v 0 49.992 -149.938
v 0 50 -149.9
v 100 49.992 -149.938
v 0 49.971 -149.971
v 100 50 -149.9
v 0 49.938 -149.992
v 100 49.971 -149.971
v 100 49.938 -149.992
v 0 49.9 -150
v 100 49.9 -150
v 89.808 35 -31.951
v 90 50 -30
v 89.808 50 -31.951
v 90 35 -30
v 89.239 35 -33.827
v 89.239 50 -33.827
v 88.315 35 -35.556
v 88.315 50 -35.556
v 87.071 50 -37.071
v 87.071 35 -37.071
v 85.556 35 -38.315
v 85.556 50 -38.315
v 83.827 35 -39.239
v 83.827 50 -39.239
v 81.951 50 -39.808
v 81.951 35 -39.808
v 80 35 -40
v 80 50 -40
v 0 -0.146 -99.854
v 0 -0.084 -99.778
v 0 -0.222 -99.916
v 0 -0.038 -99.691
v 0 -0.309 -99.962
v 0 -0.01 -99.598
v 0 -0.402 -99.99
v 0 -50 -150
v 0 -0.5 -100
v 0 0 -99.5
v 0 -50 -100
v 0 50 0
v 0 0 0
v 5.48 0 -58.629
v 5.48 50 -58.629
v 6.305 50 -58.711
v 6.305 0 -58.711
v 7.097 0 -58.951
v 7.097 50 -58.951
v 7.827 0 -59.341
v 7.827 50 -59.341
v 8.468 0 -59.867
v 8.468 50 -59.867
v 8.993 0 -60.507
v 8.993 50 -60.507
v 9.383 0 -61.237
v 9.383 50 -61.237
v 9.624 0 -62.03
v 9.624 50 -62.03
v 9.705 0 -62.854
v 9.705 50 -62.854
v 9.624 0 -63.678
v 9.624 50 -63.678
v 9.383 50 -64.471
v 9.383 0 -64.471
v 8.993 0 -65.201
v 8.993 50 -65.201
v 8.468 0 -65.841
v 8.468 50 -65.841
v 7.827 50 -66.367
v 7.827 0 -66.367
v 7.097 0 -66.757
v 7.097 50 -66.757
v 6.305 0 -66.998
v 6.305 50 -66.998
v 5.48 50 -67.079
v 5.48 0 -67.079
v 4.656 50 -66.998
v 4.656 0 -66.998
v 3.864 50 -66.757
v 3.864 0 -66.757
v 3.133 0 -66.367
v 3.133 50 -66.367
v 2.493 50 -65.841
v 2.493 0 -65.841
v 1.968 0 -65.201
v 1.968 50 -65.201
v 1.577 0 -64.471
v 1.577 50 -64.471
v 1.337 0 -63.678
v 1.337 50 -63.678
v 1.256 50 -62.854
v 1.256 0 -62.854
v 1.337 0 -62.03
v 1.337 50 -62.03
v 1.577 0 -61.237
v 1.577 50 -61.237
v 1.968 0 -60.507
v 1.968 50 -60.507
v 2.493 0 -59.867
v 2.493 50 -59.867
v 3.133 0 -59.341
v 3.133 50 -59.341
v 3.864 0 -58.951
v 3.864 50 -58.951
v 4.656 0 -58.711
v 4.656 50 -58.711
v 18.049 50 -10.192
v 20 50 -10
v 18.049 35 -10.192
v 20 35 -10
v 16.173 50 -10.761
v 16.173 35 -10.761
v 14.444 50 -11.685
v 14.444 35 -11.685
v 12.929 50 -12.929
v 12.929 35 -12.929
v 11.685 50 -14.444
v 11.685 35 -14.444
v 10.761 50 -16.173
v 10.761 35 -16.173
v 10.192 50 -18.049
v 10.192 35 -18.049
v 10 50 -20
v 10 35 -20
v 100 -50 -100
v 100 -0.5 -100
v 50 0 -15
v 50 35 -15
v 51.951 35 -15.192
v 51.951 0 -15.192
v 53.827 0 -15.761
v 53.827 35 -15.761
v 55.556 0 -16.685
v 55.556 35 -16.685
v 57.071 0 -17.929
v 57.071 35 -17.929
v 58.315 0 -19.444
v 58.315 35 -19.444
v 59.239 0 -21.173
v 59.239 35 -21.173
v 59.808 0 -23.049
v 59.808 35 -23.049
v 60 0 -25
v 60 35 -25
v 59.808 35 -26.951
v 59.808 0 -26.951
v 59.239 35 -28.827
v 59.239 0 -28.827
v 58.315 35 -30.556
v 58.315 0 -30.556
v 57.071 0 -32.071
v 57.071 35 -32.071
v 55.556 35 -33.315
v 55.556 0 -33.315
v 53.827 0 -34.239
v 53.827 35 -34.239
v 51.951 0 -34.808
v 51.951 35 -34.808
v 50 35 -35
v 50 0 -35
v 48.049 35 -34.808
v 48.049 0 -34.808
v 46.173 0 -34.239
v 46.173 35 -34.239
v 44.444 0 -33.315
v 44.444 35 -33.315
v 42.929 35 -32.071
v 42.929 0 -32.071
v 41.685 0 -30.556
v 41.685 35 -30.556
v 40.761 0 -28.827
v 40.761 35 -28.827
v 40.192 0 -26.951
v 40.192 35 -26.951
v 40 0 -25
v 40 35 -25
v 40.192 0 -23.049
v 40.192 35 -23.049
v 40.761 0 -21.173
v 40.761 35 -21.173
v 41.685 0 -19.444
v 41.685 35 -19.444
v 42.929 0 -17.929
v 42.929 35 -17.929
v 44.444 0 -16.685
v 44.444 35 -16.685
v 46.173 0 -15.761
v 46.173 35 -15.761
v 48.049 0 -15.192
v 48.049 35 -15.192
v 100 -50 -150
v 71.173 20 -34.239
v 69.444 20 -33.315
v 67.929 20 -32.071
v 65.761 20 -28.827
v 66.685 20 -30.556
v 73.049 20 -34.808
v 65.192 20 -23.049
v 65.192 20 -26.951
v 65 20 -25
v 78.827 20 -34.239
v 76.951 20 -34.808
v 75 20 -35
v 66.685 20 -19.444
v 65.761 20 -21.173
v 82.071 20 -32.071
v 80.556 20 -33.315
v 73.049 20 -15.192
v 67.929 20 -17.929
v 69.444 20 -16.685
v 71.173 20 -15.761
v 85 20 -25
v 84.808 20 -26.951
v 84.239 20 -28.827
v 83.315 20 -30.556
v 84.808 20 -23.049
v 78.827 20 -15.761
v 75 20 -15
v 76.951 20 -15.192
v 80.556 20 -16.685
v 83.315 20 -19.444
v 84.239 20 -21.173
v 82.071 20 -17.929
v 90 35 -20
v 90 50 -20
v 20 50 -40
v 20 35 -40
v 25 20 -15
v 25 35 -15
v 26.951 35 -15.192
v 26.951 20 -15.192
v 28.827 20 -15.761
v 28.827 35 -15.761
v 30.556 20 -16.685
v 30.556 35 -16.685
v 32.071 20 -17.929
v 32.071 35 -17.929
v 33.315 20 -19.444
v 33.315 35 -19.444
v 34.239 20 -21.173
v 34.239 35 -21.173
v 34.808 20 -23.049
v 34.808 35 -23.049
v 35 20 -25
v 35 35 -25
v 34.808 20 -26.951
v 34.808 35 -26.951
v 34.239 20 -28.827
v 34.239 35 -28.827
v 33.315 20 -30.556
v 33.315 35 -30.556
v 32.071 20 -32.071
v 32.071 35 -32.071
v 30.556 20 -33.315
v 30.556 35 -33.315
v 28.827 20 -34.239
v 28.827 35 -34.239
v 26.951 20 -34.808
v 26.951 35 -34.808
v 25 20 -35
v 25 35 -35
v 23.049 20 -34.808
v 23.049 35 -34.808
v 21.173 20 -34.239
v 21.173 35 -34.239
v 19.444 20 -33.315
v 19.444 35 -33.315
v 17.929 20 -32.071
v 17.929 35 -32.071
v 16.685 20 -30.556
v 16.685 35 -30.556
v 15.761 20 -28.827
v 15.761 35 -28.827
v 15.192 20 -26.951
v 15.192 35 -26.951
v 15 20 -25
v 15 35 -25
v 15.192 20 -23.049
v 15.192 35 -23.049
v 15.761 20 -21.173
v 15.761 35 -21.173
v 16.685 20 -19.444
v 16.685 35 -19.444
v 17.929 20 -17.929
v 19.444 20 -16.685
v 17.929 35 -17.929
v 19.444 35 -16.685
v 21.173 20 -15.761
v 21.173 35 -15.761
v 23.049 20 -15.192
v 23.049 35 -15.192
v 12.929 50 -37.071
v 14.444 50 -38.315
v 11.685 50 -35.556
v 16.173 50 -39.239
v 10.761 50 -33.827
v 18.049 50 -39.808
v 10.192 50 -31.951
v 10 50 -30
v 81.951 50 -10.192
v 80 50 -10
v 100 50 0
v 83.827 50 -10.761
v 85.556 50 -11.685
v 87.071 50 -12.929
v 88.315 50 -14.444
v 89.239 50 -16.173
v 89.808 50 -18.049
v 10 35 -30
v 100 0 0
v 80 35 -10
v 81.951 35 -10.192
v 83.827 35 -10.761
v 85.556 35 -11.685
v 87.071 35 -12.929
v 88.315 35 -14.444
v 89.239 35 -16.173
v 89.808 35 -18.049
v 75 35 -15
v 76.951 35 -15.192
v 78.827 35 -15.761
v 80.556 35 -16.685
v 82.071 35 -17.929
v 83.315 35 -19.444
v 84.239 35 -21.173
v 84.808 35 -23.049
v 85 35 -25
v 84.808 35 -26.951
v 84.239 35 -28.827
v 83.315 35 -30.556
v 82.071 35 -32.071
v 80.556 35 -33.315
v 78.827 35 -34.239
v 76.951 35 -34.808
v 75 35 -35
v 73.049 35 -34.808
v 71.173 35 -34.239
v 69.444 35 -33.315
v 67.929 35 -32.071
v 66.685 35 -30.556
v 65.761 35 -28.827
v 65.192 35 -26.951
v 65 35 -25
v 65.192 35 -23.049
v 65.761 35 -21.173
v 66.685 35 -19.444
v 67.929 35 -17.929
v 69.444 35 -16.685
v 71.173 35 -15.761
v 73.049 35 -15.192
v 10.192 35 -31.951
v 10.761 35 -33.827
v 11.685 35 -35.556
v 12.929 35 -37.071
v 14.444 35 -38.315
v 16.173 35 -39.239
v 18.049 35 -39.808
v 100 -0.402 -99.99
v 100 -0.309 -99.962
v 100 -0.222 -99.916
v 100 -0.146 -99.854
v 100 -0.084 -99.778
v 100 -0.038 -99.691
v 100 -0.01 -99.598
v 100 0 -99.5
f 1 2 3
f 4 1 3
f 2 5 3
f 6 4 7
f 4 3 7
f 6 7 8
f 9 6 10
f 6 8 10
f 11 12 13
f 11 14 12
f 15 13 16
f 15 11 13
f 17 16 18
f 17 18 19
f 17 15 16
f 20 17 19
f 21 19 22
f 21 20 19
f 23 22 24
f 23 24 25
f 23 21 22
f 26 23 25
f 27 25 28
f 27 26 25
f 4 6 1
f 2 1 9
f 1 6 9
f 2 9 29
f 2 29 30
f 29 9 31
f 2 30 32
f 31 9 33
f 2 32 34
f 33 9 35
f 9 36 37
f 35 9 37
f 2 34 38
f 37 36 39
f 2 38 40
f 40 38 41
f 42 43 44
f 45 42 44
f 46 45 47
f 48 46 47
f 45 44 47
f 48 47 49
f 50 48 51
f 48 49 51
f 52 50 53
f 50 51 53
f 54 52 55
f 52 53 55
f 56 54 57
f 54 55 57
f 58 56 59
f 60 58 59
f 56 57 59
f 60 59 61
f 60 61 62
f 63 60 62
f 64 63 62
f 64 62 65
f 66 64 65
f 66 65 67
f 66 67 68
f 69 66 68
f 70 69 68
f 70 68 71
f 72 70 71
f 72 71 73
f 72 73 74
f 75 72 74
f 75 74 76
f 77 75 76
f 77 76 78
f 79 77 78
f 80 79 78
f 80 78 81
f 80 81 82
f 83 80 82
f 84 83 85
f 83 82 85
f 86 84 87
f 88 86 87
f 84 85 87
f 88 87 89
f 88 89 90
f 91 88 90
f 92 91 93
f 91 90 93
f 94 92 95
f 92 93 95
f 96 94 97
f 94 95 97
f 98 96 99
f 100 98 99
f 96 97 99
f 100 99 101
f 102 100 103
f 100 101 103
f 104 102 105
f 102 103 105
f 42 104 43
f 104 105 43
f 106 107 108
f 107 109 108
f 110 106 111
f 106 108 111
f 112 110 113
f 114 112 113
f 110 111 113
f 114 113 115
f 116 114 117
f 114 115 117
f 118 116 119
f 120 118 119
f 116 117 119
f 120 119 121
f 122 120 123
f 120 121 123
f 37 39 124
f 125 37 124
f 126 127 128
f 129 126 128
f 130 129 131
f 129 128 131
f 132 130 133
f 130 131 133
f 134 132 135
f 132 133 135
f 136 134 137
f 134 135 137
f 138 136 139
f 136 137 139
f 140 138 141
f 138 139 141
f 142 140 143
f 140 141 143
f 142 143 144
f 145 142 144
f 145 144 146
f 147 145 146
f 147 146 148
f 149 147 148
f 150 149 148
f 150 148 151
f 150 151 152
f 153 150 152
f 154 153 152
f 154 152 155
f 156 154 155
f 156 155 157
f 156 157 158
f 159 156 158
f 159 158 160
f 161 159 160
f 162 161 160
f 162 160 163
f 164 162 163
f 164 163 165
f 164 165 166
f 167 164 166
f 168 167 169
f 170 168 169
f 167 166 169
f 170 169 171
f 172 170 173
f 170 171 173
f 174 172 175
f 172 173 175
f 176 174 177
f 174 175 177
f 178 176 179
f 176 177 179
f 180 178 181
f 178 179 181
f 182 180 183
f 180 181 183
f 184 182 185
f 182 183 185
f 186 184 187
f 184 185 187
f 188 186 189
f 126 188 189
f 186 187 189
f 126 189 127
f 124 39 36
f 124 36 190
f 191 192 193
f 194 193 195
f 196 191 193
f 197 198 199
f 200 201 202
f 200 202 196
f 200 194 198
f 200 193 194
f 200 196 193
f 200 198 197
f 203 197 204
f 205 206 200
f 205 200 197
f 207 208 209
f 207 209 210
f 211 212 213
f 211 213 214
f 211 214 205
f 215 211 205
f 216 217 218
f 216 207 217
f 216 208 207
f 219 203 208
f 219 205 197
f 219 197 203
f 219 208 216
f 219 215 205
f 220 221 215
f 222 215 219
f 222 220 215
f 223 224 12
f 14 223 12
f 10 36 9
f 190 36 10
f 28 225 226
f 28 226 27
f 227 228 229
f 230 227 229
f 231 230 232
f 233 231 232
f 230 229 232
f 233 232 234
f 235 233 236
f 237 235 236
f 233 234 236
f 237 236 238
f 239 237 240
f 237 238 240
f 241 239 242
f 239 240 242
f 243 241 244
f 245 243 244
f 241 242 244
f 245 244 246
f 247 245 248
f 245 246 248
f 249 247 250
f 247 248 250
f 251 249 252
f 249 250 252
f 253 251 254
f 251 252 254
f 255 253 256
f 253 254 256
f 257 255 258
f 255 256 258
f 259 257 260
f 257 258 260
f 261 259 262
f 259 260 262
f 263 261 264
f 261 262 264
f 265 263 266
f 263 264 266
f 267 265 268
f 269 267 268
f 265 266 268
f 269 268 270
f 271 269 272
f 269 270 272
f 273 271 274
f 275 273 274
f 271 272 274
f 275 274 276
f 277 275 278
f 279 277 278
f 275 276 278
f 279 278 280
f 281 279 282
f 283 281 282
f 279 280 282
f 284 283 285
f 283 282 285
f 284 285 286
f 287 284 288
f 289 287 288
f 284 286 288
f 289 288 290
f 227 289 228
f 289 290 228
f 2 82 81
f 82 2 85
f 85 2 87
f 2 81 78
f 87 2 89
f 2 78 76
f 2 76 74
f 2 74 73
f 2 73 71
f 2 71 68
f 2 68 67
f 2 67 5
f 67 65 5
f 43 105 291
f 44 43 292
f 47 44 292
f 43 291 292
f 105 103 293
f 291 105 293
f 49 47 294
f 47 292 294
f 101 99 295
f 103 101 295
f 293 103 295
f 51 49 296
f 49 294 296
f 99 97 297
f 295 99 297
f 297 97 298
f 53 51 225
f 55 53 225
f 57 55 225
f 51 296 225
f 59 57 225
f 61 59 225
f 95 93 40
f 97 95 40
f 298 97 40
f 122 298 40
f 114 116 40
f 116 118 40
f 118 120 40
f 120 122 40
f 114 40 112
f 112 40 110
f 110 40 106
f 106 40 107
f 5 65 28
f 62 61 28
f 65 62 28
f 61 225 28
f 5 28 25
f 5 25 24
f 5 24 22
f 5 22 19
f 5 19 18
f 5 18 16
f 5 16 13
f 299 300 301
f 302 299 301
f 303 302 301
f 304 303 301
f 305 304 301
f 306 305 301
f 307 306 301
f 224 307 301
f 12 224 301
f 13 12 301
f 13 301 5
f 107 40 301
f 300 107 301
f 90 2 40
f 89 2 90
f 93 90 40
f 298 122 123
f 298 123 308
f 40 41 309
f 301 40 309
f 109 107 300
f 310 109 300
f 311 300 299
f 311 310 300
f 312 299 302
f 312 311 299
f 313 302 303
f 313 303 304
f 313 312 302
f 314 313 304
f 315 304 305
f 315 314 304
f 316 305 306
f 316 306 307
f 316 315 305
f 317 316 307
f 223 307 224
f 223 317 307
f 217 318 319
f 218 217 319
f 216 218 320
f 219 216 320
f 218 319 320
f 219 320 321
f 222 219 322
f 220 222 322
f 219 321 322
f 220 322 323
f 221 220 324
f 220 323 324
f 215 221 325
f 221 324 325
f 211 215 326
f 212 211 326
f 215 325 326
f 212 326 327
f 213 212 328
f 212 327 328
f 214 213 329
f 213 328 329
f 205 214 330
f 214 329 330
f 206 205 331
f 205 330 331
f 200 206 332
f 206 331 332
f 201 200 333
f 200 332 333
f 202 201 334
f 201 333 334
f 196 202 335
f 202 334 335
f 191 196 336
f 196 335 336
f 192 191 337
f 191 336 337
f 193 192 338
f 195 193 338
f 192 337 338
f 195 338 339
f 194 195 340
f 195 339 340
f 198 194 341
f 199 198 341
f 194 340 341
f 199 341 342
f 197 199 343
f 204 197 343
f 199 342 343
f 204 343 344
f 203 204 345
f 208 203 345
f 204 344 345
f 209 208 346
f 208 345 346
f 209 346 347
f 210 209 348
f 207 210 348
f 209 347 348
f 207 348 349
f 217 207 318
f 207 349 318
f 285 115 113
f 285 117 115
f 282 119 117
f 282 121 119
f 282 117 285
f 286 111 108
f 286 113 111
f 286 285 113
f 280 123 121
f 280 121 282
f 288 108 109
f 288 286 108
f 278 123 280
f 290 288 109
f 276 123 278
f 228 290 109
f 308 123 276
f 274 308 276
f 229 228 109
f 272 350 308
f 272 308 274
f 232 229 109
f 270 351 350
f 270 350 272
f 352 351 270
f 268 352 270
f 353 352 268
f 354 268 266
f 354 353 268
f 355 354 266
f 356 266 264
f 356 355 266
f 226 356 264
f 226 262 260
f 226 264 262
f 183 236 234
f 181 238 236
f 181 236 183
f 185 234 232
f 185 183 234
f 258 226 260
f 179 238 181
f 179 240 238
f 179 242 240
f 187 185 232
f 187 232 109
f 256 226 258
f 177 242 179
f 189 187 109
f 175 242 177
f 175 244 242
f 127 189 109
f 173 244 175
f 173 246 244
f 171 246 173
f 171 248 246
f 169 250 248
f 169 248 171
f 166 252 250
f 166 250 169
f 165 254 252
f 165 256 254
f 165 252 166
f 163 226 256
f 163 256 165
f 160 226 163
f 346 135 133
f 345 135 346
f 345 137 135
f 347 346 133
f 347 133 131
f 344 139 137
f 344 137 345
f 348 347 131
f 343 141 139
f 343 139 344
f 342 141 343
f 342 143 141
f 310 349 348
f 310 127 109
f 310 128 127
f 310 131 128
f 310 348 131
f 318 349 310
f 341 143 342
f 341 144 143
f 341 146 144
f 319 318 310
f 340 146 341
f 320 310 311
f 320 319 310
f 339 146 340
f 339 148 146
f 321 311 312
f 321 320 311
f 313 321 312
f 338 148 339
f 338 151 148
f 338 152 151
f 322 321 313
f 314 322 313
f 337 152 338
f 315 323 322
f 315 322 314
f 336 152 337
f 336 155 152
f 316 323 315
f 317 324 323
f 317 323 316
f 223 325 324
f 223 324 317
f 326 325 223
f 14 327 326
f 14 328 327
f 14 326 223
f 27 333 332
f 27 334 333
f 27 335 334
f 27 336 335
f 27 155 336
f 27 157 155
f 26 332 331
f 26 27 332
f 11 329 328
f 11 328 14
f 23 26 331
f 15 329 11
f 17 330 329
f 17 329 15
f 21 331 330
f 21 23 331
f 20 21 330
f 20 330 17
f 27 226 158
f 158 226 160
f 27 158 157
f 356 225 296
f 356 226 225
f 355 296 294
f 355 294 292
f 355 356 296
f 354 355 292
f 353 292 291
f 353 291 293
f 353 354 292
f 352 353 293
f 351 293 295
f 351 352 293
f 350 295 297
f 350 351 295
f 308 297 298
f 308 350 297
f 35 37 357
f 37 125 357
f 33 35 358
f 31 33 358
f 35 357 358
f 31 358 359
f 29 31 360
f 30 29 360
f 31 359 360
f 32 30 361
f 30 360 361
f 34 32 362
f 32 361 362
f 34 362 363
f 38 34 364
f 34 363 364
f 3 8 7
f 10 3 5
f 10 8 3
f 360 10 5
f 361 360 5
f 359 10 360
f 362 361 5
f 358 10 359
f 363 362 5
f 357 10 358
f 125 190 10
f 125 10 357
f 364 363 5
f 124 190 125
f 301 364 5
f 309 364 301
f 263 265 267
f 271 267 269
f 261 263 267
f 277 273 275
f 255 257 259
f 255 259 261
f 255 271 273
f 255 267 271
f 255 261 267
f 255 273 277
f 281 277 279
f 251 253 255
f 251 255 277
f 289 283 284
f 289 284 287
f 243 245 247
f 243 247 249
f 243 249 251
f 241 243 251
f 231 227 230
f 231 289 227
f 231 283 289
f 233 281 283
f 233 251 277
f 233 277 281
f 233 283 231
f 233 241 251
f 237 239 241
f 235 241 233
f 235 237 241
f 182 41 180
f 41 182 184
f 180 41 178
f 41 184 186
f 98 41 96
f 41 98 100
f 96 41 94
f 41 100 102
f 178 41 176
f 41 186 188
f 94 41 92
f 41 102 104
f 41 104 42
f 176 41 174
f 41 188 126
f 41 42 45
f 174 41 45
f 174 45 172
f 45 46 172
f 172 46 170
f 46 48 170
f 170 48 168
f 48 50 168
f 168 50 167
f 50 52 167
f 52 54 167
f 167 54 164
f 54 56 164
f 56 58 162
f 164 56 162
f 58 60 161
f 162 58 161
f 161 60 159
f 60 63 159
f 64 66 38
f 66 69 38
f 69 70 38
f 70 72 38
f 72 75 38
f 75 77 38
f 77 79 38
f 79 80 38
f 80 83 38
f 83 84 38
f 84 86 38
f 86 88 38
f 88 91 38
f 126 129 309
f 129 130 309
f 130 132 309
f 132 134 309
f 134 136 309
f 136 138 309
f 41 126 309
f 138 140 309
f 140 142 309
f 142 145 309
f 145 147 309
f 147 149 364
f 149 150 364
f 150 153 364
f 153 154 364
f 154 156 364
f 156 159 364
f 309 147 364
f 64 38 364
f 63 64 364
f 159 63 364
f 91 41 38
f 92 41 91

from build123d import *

# Parameters (mm, degrees)
SKETCH1_W           = 100
SKETCH1_H           = 100
BOSS_EXTRUDE1_DEPTH = 50
SKETCH3_W           = 80
SKETCH3_H           = 30
CUT_EXTRUDE2_DEPTH  = 15
FILLET1_R           = 10
SKETCH4_R           = 10
CUT_EXTRUDE3_DEPTH  = 15
SKETCH5_R           = 10
CUT_EXTRUDE4_DEPTH  = 146.688022843
SKETCH6_W           = 100
SKETCH6_H           = 50
BOSS_EXTRUDE2_DEPTH = 50
FILLET2_R           = 0.1
SKETCH7_R           = 4.224664999
CUT_EXTRUDE5_DEPTH  = 207.155281281
FILLET3_R           = 0.5


with BuildPart() as part:
    # Sketch1 → Boss-Extrude1 (new body)
    with BuildSketch(Plane(origin=(0, 0, 0), x_dir=(1, 0, 0), z_dir=(0, 1, 0))):
        with Locations((50, 50)):
            Rectangle(SKETCH1_W, SKETCH1_H)
    extrude(amount=BOSS_EXTRUDE1_DEPTH)

    # Sketch3 → Cut-Extrude2 (cut)
    with BuildSketch(Plane(origin=(0, 50, 0), x_dir=(1, 0, 0), z_dir=(0, 1, 0))):
        with Locations((50, 25)):
            Rectangle(SKETCH3_W, SKETCH3_H)
    extrude(amount=-CUT_EXTRUDE2_DEPTH, mode=Mode.SUBTRACT)

    # Fillet1
    fillet1_edges = [part.edges().sort_by_distance(p)[0] for p in [
        (90, 42.5, -10),
        (90, 42.5, -40),
        (10, 42.5, -40),
        (10, 42.5, -10),
    ]]
    fillet(fillet1_edges, radius=FILLET1_R)

    # Sketch4 → Cut-Extrude3 (cut)
    with BuildSketch(Plane(origin=(0, 35, 0), x_dir=(1, 0, 0), z_dir=(0, 1, 0))):
        with Locations((25, 25)):
            Circle(SKETCH4_R)
        with Locations((75, 25)):
            Circle(SKETCH4_R)
    extrude(amount=-CUT_EXTRUDE3_DEPTH, mode=Mode.SUBTRACT)

    # Sketch5 → Cut-Extrude4 (cut, through all)
    with BuildSketch(Plane(origin=(0, 35, 0), x_dir=(1, 0, 0), z_dir=(0, 1, 0))):
        with Locations((50, 25)):
            Circle(SKETCH5_R)
    extrude(amount=-CUT_EXTRUDE4_DEPTH, mode=Mode.SUBTRACT)

    # Sketch6 → Boss-Extrude2 (add, symmetric)
    with BuildSketch(Plane.XZ):
        with Locations((50, -125)):
            Rectangle(SKETCH6_W, SKETCH6_H)
    extrude(amount=BOSS_EXTRUDE2_DEPTH, both=True)

    # Fillet2
    fillet2_edges = [part.edges().sort_by_distance(p)[0] for p in [
        (50, 50, -150),
    ]]
    fillet(fillet2_edges, radius=FILLET2_R)

    # Sketch7 → Cut-Extrude5 (cut, through all)
    with BuildSketch(Plane(origin=(0, 50, 0), x_dir=(1, 0, 0), z_dir=(0, 1, 0))):
        with Locations((5.480381348, 62.854130386)):
            Circle(SKETCH7_R)
    extrude(amount=-CUT_EXTRUDE5_DEPTH, mode=Mode.SUBTRACT)

    # Fillet3
    fillet3_edges = [part.edges().sort_by_distance(p)[0] for p in [
        (50, 0, -100),
    ]]
    fillet(fillet3_edges, radius=FILLET3_R)


solid = part.part
